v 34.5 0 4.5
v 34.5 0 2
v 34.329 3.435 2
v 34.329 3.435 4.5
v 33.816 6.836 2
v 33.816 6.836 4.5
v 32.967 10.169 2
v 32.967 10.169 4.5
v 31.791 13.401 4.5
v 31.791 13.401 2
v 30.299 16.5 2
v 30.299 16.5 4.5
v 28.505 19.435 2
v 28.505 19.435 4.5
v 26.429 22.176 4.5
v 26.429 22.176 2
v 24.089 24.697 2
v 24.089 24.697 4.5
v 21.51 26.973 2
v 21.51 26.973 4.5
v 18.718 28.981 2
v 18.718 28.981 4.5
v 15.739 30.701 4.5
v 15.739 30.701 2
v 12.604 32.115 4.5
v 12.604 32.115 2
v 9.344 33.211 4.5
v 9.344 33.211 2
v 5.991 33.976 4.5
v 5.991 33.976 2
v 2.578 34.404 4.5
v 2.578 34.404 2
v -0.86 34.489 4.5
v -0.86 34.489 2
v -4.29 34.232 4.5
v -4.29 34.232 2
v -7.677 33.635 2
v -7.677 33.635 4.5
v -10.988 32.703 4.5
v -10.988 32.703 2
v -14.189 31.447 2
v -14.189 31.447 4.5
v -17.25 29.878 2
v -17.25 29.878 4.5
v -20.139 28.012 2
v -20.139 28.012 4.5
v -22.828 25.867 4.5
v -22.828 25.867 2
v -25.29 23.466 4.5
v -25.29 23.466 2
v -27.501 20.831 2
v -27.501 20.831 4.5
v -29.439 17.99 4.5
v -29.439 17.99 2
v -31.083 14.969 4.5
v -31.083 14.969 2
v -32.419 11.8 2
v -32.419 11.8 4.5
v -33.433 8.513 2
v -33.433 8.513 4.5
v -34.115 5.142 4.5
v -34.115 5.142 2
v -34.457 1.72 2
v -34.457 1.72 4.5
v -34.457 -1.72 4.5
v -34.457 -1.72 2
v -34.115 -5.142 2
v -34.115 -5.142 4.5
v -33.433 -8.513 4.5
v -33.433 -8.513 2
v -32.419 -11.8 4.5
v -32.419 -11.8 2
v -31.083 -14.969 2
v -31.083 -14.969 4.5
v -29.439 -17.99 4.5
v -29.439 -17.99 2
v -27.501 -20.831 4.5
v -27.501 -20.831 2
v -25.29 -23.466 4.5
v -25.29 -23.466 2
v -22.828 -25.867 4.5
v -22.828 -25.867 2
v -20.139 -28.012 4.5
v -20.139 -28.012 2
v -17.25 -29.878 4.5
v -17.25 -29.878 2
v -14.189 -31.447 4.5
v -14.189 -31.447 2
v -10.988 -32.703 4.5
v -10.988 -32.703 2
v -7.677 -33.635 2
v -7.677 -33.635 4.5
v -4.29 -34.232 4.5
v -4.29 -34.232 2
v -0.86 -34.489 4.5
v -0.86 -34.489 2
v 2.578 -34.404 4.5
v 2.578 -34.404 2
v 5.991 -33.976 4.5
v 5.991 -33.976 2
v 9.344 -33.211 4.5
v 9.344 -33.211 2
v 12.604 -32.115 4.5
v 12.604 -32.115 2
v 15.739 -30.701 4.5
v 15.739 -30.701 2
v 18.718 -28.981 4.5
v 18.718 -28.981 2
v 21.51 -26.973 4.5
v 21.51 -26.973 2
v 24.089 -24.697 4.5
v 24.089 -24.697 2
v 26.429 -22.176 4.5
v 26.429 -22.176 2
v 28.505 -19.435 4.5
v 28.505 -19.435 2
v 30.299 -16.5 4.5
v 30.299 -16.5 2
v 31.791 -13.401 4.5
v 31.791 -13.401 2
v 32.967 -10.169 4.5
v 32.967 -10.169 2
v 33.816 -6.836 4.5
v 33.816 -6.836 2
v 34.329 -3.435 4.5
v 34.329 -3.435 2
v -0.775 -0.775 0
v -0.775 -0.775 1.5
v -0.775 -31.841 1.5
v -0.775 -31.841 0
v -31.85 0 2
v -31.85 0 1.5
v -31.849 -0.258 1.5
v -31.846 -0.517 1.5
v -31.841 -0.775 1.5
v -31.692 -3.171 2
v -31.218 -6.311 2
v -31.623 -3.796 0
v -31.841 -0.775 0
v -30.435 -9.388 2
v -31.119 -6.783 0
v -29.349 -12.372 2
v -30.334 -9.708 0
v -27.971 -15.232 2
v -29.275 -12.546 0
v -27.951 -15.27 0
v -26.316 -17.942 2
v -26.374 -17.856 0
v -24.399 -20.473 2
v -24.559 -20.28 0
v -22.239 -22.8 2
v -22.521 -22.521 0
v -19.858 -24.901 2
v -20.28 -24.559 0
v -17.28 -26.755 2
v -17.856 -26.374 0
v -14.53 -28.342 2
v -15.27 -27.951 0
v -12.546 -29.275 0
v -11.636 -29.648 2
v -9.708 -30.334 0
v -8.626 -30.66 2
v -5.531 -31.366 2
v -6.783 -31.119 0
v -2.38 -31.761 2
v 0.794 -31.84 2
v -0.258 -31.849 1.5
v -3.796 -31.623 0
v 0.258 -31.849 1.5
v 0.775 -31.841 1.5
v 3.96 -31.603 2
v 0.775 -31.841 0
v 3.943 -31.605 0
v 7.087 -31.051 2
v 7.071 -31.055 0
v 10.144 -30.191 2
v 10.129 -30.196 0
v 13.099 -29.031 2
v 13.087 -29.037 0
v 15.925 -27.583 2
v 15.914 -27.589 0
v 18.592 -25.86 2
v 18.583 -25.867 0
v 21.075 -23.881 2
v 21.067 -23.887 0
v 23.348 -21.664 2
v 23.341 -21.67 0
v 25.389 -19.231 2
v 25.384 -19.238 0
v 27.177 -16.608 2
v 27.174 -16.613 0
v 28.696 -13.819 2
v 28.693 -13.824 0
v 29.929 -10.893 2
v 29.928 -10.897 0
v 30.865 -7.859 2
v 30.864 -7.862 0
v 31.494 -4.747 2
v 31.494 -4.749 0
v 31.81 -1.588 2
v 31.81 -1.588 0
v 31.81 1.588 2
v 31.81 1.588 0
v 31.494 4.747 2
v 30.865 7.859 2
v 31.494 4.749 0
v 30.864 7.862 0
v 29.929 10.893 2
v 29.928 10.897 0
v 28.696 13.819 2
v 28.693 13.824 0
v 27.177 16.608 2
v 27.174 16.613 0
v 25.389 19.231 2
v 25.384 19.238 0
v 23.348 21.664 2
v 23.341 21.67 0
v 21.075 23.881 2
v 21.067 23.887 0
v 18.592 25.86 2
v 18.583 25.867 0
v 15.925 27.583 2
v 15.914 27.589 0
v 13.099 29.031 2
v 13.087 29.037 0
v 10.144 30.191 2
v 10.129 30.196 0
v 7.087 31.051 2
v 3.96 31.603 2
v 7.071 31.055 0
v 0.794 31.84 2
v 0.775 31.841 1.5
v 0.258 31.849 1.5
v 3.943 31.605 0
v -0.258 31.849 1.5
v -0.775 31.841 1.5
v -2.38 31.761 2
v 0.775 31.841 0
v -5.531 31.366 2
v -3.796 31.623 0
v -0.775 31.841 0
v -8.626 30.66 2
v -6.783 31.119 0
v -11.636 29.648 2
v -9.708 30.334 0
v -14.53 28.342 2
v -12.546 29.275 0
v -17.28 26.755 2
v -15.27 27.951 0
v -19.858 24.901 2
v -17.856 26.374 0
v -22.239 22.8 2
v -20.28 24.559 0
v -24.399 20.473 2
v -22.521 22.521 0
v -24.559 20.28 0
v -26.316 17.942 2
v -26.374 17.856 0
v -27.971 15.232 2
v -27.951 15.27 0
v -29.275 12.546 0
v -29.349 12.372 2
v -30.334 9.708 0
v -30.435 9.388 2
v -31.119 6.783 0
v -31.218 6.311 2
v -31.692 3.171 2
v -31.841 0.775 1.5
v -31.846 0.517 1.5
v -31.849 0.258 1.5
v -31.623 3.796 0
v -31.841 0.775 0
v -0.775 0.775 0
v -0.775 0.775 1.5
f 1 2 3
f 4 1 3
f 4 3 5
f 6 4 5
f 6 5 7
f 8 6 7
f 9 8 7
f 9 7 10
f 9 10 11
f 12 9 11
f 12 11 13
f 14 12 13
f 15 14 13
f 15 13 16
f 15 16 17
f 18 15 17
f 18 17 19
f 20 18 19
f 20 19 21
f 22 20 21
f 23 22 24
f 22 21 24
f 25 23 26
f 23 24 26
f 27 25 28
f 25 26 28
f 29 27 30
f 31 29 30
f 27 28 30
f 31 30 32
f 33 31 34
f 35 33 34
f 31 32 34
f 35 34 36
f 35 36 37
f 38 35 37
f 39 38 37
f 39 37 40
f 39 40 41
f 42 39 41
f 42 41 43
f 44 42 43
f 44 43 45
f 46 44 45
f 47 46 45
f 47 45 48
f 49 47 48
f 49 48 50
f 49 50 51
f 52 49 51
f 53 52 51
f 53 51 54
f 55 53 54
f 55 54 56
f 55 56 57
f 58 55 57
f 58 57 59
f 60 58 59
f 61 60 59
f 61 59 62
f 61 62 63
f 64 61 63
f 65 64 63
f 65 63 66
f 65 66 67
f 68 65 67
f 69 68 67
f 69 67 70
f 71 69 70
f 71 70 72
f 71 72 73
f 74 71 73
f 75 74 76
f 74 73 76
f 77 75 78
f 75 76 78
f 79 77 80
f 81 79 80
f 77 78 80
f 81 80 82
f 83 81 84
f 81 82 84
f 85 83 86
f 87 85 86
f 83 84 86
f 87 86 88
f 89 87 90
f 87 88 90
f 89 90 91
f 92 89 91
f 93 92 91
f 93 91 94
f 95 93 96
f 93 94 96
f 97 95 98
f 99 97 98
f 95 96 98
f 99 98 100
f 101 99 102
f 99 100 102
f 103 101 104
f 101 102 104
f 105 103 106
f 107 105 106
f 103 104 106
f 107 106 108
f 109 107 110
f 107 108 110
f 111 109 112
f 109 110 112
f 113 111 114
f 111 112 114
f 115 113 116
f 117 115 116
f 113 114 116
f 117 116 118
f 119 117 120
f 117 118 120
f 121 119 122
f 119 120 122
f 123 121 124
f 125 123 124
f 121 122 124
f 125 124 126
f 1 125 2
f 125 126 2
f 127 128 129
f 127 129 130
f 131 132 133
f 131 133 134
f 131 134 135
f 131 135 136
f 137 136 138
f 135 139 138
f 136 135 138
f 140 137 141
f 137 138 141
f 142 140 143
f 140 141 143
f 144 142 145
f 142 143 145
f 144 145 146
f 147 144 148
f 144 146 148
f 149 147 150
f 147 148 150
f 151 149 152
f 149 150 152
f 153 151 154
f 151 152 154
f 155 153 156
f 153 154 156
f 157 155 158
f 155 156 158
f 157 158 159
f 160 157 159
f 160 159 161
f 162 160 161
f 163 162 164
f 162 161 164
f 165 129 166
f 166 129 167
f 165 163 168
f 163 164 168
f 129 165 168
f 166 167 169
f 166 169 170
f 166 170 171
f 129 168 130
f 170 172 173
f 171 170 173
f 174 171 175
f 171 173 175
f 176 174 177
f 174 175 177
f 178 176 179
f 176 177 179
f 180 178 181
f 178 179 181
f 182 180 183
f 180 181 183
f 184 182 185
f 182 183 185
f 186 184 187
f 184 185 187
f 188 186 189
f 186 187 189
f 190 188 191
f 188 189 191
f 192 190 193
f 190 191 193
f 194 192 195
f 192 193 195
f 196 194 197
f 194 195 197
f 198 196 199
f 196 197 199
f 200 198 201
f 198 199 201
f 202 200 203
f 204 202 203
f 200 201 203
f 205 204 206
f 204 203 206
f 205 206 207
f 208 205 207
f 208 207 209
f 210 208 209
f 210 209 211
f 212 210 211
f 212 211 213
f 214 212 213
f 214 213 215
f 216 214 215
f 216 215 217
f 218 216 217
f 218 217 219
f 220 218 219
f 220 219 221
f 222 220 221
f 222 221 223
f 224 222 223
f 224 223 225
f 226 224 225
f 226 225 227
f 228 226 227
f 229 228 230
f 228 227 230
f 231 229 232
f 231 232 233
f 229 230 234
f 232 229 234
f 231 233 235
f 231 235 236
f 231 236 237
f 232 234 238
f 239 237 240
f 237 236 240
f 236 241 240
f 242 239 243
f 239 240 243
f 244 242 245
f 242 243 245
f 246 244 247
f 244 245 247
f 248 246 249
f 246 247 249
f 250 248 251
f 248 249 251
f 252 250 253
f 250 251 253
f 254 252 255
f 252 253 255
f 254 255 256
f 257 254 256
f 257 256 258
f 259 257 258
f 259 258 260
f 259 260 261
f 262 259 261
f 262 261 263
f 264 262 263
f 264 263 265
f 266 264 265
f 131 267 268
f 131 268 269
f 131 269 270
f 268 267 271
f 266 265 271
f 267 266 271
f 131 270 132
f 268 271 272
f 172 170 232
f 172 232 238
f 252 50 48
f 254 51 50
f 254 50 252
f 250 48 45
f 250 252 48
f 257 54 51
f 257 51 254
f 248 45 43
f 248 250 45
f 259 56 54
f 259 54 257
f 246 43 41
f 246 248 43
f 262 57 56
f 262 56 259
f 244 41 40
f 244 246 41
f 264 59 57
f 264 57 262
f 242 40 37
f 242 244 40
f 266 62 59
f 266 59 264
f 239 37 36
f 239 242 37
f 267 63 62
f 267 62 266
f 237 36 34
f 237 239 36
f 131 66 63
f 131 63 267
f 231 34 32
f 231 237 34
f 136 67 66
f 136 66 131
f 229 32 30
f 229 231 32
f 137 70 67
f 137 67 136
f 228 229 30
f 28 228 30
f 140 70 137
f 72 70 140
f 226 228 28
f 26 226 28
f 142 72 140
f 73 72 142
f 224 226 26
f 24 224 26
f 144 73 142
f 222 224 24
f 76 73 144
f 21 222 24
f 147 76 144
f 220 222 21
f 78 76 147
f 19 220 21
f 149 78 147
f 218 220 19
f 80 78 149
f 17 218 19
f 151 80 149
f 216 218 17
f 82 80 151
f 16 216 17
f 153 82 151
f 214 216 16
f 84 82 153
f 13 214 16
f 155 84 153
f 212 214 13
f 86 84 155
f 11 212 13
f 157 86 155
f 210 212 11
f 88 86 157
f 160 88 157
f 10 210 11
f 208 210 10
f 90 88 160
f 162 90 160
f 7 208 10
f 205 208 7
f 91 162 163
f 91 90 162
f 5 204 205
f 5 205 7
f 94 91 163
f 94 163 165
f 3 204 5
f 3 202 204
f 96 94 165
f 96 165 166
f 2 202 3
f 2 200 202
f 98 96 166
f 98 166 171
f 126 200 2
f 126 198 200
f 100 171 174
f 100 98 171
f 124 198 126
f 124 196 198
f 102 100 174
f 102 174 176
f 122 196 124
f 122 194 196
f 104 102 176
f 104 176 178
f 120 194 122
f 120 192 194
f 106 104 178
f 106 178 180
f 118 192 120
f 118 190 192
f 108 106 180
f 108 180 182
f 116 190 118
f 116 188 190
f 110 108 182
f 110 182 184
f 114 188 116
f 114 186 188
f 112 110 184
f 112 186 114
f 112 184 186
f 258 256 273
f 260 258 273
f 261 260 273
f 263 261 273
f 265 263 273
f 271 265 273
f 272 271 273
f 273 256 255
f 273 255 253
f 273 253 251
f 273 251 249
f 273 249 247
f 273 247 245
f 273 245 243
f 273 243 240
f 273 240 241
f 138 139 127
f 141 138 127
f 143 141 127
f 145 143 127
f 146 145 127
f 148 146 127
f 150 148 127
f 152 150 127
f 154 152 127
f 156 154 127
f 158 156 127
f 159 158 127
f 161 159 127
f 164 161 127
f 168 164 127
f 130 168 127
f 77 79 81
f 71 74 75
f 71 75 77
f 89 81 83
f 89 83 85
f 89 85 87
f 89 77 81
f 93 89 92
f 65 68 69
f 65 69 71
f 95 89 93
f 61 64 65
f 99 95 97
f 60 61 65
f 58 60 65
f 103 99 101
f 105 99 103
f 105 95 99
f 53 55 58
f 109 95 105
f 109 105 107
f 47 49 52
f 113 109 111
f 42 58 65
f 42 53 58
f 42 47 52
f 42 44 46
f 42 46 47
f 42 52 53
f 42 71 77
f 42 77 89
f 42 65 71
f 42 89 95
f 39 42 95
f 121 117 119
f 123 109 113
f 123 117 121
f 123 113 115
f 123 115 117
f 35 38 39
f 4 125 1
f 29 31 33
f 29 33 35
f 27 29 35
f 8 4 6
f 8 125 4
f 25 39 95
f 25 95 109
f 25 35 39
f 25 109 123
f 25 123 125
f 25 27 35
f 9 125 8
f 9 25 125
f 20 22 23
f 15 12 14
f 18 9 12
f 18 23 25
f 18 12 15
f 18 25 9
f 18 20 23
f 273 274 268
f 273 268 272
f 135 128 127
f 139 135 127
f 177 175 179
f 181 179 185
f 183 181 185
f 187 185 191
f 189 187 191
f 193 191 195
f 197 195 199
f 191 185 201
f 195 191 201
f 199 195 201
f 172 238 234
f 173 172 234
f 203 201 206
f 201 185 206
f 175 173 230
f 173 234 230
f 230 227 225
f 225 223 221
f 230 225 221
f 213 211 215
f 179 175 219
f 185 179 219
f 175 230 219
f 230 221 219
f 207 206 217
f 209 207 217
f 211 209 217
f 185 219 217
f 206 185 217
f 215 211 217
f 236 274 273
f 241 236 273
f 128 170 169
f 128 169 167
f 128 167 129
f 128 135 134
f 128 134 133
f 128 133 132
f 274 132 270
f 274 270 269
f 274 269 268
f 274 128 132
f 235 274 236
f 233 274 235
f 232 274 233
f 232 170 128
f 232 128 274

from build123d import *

# Parameters (mm, degrees)
SKETCH1_R               = 34.5
BOSS_EXTRUDE1_DEPTH     = 4.5
SKETCH2_W               = 2.65
SKETCH2_H               = 2
CUT_EXTRUDE1_DEPTH      = 49.997448913
CUT_EXTRUDE1_DEPTH_BACK = 49.997448913
SKETCH4_W               = 1.55
SKETCH4_H               = 1.5
SKETCH6_W               = 1.5
SKETCH6_H               = 1.55
CUT_EXTRUDE2_DEPTH      = 49.997448913


with BuildPart() as part:
    # Sketch1 → Boss-Extrude1 (new body)
    with BuildSketch(Plane.XY):
        Circle(SKETCH1_R)
    extrude(amount=BOSS_EXTRUDE1_DEPTH)

    # Sketch2 → Cut-Revolve1 (revolve, cut)
    with BuildSketch(Plane(origin=(0, 0, 0), x_dir=(1, 0, 0), z_dir=(0, 1, 0)), mode=Mode.PRIVATE) as cut_revolve1_sk:
        with Locations((33.175, -1)):
            Rectangle(SKETCH2_W, SKETCH2_H)
    revolve(cut_revolve1_sk.sketch.rotate(Axis((0, 0, 0), (0, 0, 1)), 180), axis=Axis((0, 0, 0), (0, 0, 1)), mode=Mode.SUBTRACT)

    # Sketch4 → Cut-Extrude1 (cut, two sides: drawn at the far end of the back side and taken through both)
    with BuildSketch(Plane(origin=(0, 0, 0), x_dir=(1, 0, 0), z_dir=(0, 1, 0)).offset(-CUT_EXTRUDE1_DEPTH_BACK)):
        with Locations((0, -0.75)):
            Rectangle(SKETCH4_W, SKETCH4_H)
    extrude(amount=CUT_EXTRUDE1_DEPTH + CUT_EXTRUDE1_DEPTH_BACK, mode=Mode.SUBTRACT)

    # Sketch6 → Cut-Extrude2 (cut, through all)
    with BuildSketch(Plane(origin=(0, 0, 0), x_dir=(0, 0, -1), z_dir=(1, 0, 0))):
        with Locations((-0.75, 0)):
            Rectangle(SKETCH6_W, SKETCH6_H)
    extrude(amount=-CUT_EXTRUDE2_DEPTH, mode=Mode.SUBTRACT)


solid = part.part
